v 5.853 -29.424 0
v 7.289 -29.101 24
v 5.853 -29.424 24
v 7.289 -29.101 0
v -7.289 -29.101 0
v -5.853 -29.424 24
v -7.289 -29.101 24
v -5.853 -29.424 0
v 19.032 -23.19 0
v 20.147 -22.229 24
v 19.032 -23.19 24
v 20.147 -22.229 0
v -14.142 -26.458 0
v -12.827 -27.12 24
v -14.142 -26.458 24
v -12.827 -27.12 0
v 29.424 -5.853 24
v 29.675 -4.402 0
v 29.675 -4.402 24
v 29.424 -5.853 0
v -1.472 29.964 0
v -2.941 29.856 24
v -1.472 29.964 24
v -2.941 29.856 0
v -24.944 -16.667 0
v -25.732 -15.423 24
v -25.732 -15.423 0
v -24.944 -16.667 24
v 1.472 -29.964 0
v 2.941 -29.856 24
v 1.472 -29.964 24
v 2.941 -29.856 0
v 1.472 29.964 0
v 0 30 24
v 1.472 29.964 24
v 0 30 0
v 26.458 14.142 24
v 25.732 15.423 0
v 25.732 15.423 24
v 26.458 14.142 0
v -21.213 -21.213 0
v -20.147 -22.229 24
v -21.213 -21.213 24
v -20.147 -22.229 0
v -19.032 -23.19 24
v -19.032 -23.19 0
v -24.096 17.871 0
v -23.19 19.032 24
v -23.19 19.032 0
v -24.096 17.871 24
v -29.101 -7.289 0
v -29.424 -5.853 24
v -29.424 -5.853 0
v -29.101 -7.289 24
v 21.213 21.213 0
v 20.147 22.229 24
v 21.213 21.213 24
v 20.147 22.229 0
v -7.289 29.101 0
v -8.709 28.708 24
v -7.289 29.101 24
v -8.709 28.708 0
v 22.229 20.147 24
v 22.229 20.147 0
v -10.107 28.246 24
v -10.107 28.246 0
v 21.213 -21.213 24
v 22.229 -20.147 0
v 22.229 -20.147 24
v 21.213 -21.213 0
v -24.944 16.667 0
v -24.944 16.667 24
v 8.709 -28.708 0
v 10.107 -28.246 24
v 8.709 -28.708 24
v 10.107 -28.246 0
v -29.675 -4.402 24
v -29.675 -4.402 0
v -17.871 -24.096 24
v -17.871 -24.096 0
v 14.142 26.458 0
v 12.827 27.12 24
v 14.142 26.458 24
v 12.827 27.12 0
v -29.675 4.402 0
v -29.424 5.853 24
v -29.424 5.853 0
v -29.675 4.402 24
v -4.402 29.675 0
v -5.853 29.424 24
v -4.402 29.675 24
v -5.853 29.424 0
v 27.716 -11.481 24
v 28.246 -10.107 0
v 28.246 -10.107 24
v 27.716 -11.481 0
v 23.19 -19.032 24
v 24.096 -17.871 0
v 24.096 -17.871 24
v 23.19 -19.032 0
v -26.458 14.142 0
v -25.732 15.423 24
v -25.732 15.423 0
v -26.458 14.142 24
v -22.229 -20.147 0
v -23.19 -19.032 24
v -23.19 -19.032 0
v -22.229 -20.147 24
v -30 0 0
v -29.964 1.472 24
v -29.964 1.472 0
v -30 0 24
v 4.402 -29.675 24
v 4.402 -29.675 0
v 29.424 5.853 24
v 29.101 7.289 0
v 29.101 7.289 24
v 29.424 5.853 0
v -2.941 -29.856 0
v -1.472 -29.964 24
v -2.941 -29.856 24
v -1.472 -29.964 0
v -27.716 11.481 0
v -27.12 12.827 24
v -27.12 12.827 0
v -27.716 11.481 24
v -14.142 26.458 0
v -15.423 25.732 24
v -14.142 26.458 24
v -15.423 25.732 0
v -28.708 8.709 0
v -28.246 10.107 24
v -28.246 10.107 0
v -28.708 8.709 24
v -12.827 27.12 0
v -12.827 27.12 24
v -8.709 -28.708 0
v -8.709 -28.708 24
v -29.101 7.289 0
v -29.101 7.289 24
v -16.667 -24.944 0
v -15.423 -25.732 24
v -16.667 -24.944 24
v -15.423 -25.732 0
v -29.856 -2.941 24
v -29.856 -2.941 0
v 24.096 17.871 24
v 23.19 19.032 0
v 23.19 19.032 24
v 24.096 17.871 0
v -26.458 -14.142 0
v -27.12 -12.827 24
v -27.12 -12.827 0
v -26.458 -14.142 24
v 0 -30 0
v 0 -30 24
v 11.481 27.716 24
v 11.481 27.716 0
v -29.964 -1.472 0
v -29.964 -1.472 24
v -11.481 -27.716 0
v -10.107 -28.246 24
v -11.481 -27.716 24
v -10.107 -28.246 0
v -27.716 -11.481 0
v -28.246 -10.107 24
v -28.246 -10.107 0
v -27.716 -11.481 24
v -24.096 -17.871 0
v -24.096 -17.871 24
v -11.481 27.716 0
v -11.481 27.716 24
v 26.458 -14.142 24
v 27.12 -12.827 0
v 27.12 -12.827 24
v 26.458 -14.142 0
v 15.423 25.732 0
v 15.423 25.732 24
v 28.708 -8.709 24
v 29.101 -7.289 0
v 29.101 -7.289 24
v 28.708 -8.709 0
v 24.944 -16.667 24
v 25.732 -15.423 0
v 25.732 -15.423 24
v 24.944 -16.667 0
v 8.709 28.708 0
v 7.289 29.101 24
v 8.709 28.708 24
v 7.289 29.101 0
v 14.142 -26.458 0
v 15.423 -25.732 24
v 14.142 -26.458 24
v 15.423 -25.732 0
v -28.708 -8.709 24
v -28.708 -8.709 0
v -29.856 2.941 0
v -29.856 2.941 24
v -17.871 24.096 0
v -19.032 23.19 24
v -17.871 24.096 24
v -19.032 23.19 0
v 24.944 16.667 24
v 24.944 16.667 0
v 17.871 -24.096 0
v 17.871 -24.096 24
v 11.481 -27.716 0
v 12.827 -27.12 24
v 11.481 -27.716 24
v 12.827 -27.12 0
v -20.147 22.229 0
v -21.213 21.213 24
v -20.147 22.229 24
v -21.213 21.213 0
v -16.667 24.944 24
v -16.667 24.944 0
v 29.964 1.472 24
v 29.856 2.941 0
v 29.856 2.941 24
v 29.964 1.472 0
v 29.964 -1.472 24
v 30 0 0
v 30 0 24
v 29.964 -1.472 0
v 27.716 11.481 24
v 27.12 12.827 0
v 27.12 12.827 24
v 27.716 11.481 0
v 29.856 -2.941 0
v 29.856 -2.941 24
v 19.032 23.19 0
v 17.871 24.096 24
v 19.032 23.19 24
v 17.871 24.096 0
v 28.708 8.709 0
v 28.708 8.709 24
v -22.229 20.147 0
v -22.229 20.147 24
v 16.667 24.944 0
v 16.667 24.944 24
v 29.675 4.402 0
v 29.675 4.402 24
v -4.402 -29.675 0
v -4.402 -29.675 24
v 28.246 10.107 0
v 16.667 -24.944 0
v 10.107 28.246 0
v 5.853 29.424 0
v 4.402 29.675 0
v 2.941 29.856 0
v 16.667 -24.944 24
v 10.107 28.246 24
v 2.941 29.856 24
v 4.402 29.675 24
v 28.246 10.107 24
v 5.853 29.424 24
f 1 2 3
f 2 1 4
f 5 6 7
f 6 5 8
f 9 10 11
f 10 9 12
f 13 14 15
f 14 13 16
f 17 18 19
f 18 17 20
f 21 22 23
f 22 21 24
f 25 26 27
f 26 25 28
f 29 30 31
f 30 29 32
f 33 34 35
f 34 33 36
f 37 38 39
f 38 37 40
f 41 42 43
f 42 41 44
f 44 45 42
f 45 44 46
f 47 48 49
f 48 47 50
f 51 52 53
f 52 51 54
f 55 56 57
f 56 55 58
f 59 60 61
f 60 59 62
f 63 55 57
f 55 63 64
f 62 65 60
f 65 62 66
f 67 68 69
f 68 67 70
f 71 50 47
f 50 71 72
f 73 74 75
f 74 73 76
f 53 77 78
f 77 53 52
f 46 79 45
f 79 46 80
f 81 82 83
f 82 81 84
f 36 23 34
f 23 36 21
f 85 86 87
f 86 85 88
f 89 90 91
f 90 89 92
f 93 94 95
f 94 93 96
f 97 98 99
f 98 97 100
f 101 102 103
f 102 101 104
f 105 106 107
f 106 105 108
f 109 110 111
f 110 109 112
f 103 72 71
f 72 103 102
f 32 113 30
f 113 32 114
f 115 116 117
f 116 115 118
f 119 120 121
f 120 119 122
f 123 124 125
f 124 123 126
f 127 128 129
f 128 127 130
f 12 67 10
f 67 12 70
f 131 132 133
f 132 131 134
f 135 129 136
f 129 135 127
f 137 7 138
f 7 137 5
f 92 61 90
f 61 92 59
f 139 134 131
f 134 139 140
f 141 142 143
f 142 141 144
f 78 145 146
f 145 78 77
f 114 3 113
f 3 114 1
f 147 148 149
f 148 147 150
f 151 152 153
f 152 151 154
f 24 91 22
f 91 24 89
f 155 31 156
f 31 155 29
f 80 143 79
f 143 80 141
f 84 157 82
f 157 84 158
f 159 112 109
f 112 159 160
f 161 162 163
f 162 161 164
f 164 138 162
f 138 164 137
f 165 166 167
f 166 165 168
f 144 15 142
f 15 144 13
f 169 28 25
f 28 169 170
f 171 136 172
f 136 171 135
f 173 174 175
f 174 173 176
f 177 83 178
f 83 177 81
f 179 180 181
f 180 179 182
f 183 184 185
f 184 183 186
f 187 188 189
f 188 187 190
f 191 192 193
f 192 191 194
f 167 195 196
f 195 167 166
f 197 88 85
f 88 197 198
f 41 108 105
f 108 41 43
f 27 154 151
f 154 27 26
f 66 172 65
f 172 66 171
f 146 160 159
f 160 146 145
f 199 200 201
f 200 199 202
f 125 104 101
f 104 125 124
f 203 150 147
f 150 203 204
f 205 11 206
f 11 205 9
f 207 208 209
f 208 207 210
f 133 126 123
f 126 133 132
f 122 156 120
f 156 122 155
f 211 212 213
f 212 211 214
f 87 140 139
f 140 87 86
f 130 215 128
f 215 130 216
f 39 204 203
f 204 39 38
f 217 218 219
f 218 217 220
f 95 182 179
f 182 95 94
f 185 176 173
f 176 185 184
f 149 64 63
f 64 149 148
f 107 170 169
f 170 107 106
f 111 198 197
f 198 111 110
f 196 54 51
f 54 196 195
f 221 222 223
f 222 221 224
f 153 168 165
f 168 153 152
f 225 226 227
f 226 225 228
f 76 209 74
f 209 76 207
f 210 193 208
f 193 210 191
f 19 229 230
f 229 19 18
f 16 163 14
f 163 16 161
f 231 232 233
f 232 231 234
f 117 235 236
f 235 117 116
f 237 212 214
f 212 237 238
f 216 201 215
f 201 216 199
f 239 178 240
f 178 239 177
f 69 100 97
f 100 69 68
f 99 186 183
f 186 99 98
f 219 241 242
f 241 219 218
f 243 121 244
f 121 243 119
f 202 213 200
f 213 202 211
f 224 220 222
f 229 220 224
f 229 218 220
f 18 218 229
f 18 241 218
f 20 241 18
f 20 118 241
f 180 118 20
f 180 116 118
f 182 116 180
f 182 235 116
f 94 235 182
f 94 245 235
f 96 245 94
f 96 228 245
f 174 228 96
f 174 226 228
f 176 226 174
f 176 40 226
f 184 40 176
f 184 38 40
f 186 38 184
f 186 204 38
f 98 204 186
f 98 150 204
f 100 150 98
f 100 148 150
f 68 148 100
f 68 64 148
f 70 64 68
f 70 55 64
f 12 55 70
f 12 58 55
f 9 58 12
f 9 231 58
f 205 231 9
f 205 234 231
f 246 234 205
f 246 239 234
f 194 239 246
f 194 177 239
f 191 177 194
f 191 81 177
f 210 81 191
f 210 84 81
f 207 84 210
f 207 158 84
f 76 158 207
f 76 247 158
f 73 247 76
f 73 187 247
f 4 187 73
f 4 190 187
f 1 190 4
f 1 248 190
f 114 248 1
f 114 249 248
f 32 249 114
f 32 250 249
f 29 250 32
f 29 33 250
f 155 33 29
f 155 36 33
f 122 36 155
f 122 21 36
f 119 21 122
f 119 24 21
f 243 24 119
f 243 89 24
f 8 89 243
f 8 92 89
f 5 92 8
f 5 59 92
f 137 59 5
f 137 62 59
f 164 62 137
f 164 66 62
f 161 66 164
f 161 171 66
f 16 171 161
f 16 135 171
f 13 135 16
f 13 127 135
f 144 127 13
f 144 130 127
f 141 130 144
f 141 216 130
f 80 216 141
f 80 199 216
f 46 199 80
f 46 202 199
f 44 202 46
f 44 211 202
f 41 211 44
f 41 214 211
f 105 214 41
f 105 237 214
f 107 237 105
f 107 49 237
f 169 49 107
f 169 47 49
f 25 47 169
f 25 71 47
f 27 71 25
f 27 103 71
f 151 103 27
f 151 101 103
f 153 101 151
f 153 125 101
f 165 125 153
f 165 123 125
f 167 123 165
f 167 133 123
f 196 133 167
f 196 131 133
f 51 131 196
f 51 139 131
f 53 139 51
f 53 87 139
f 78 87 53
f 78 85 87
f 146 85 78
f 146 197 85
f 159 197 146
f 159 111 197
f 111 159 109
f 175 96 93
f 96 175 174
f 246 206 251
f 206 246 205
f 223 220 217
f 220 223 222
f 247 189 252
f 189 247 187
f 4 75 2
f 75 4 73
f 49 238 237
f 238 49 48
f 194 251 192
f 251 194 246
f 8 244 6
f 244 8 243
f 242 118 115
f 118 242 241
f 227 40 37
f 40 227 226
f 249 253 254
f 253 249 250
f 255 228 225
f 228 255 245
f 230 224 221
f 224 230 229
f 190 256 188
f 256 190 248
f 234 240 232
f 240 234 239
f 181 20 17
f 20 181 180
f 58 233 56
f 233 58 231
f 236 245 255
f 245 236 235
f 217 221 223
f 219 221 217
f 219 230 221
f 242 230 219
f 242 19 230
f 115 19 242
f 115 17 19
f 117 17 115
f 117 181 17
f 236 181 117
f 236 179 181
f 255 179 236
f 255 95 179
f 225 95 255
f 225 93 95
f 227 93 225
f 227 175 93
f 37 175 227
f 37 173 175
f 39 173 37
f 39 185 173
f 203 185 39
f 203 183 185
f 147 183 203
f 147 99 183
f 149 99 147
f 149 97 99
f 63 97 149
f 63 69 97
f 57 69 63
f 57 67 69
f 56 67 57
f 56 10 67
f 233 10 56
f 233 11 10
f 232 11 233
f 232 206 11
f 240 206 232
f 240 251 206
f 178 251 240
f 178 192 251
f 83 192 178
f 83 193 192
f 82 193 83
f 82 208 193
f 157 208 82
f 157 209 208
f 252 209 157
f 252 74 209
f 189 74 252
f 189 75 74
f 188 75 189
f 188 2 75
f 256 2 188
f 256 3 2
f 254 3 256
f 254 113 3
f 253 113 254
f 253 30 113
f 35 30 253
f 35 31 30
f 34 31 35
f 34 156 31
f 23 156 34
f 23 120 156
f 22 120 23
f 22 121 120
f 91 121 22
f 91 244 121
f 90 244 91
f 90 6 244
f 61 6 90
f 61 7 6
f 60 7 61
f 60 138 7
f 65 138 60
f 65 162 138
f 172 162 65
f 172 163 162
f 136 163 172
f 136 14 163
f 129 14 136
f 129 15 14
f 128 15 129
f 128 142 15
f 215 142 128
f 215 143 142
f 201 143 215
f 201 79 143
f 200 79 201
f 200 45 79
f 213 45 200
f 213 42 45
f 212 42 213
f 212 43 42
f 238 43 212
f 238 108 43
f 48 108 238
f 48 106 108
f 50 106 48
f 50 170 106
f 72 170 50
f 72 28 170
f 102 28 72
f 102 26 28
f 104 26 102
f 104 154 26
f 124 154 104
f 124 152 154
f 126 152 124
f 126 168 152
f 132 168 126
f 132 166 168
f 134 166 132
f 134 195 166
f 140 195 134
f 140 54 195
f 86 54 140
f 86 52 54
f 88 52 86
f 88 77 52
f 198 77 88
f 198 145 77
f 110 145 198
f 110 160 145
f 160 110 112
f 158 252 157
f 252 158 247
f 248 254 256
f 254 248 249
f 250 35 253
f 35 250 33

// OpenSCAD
/*
  Parametric solid cylinder for MakerWorld Customizer

  The default is a solid cylinder. An optional centered through-hole turns it
  into a hollow cylinder. Rounded edges are formed in the radial cross-section,
  so the bottom always remains on Z=0 and the model is ready to print.
*/

/* [Overall Size] */

// Outside diameter (mm).
outer_diameter = 60; // [3:300]

// Total height (mm).
model_height = 24; // [0.2:0.2:300]

/* [Optional Hollow Center] */

// Enable a centered hole through the full height. Disabled by default for a solid cylinder.
hollow = false; // [false, true]

// Radial wall thickness when Hollow is enabled (mm). Oversized values are automatically limited.
wall_thickness = 3; // [0.2:0.1:100]

/* [Outer Edge Rounding] */

// Radius of the rounded outside top edge (mm). With Hollow enabled, it is limited to preserve the wall.
top_edge_radius = 0; // [0:0.1:100]

// Radius of the rounded outside bottom edge (mm). With Hollow enabled, it is limited to preserve the wall.
bottom_edge_radius = 0; // [0:0.1:100]

/* [Hidden] */

curve_fn = 128;
edge_segments = 16;
epsilon = 0.02;

function arc_points(cx, cz, radius, start_angle, end_angle, segments) =
    radius <= 0.001
        ? []
        : [
            for (i = [0 : segments])
                let(angle = start_angle + (end_angle - start_angle) * i / segments)
                [cx + radius * cos(angle), cz + radius * sin(angle)]
        ];

module rounded_outer_body(radius, height, top_radius, bottom_radius) {
    bottom_arc = arc_points(
        radius - bottom_radius,
        bottom_radius,
        bottom_radius,
        270,
        360,
        edge_segments
    );
    top_arc = arc_points(
        radius - top_radius,
        height - top_radius,
        top_radius,
        0,
        90,
        edge_segments
    );

    profile = concat(
        [[0, 0]],
        bottom_radius <= 0.001 ? [[radius, 0]] : bottom_arc,
        top_radius <= 0.001 ? [[radius, height]] : top_arc,
        [[0, height]]
    );

    rotate_extrude(convexity = 10, $fn = curve_fn)
        polygon(profile);
}

module cylinder_family() {
    diameter = max(outer_diameter, 0.2);
    height = max(model_height, 0.2);
    radius = diameter / 2;
    // Leave a small positive inner radius even when a wall request is too large.
    safe_wall = min(max(wall_thickness, 0.2), max(radius - 0.01, 0.01));
    inner_radius = max(radius - safe_wall, 0.01);

    top_limit = hollow ? min(radius, safe_wall * 0.49) : radius;
    bottom_limit = hollow ? min(radius, safe_wall * 0.49) : radius;
    top_initial = min(max(top_edge_radius, 0), top_limit);
    bottom_initial = min(max(bottom_edge_radius, 0), bottom_limit);
    radius_sum = top_initial + bottom_initial;
    // Preserve a tiny straight section if both fillets would otherwise meet
    // at a duplicate profile point.
    height_scale = radius_sum > 0
        ? min(1, max(height - 0.01, 0.001) / radius_sum)
        : 1;
    safe_top_radius = top_initial * height_scale;
    safe_bottom_radius = bottom_initial * height_scale;

    if (wall_thickness > safe_wall && hollow)
        echo(str("Wall Thickness limited from ", wall_thickness, " mm to ", safe_wall, " mm."));
    if (top_edge_radius > safe_top_radius)
        echo(str("Top Edge Radius limited from ", top_edge_radius, " mm to ", safe_top_radius, " mm."));
    if (bottom_edge_radius > safe_bottom_radius)
        echo(str("Bottom Edge Radius limited from ", bottom_edge_radius, " mm to ", safe_bottom_radius, " mm."));

    if (hollow) {
        difference() {
            rounded_outer_body(radius, height, safe_top_radius, safe_bottom_radius);
            translate([0, 0, -epsilon])
                cylinder(r = inner_radius, h = height + 2 * epsilon, $fn = curve_fn);
        }
    } else {
        // The fully enclosed seed makes OpenSCAD weld the rotate_extrude seam
        // through its boolean mesh path without changing the outside shape.
        union() {
            rounded_outer_body(radius, height, safe_top_radius, safe_bottom_radius);
            translate([0, 0, height / 2])
                sphere(r = min(radius, height) / 1000, $fn = 8);
        }
    }
}

// Force the same welded CGAL mesh path for both solid and hollow variants.
render(convexity = 10)
    cylinder_family();
